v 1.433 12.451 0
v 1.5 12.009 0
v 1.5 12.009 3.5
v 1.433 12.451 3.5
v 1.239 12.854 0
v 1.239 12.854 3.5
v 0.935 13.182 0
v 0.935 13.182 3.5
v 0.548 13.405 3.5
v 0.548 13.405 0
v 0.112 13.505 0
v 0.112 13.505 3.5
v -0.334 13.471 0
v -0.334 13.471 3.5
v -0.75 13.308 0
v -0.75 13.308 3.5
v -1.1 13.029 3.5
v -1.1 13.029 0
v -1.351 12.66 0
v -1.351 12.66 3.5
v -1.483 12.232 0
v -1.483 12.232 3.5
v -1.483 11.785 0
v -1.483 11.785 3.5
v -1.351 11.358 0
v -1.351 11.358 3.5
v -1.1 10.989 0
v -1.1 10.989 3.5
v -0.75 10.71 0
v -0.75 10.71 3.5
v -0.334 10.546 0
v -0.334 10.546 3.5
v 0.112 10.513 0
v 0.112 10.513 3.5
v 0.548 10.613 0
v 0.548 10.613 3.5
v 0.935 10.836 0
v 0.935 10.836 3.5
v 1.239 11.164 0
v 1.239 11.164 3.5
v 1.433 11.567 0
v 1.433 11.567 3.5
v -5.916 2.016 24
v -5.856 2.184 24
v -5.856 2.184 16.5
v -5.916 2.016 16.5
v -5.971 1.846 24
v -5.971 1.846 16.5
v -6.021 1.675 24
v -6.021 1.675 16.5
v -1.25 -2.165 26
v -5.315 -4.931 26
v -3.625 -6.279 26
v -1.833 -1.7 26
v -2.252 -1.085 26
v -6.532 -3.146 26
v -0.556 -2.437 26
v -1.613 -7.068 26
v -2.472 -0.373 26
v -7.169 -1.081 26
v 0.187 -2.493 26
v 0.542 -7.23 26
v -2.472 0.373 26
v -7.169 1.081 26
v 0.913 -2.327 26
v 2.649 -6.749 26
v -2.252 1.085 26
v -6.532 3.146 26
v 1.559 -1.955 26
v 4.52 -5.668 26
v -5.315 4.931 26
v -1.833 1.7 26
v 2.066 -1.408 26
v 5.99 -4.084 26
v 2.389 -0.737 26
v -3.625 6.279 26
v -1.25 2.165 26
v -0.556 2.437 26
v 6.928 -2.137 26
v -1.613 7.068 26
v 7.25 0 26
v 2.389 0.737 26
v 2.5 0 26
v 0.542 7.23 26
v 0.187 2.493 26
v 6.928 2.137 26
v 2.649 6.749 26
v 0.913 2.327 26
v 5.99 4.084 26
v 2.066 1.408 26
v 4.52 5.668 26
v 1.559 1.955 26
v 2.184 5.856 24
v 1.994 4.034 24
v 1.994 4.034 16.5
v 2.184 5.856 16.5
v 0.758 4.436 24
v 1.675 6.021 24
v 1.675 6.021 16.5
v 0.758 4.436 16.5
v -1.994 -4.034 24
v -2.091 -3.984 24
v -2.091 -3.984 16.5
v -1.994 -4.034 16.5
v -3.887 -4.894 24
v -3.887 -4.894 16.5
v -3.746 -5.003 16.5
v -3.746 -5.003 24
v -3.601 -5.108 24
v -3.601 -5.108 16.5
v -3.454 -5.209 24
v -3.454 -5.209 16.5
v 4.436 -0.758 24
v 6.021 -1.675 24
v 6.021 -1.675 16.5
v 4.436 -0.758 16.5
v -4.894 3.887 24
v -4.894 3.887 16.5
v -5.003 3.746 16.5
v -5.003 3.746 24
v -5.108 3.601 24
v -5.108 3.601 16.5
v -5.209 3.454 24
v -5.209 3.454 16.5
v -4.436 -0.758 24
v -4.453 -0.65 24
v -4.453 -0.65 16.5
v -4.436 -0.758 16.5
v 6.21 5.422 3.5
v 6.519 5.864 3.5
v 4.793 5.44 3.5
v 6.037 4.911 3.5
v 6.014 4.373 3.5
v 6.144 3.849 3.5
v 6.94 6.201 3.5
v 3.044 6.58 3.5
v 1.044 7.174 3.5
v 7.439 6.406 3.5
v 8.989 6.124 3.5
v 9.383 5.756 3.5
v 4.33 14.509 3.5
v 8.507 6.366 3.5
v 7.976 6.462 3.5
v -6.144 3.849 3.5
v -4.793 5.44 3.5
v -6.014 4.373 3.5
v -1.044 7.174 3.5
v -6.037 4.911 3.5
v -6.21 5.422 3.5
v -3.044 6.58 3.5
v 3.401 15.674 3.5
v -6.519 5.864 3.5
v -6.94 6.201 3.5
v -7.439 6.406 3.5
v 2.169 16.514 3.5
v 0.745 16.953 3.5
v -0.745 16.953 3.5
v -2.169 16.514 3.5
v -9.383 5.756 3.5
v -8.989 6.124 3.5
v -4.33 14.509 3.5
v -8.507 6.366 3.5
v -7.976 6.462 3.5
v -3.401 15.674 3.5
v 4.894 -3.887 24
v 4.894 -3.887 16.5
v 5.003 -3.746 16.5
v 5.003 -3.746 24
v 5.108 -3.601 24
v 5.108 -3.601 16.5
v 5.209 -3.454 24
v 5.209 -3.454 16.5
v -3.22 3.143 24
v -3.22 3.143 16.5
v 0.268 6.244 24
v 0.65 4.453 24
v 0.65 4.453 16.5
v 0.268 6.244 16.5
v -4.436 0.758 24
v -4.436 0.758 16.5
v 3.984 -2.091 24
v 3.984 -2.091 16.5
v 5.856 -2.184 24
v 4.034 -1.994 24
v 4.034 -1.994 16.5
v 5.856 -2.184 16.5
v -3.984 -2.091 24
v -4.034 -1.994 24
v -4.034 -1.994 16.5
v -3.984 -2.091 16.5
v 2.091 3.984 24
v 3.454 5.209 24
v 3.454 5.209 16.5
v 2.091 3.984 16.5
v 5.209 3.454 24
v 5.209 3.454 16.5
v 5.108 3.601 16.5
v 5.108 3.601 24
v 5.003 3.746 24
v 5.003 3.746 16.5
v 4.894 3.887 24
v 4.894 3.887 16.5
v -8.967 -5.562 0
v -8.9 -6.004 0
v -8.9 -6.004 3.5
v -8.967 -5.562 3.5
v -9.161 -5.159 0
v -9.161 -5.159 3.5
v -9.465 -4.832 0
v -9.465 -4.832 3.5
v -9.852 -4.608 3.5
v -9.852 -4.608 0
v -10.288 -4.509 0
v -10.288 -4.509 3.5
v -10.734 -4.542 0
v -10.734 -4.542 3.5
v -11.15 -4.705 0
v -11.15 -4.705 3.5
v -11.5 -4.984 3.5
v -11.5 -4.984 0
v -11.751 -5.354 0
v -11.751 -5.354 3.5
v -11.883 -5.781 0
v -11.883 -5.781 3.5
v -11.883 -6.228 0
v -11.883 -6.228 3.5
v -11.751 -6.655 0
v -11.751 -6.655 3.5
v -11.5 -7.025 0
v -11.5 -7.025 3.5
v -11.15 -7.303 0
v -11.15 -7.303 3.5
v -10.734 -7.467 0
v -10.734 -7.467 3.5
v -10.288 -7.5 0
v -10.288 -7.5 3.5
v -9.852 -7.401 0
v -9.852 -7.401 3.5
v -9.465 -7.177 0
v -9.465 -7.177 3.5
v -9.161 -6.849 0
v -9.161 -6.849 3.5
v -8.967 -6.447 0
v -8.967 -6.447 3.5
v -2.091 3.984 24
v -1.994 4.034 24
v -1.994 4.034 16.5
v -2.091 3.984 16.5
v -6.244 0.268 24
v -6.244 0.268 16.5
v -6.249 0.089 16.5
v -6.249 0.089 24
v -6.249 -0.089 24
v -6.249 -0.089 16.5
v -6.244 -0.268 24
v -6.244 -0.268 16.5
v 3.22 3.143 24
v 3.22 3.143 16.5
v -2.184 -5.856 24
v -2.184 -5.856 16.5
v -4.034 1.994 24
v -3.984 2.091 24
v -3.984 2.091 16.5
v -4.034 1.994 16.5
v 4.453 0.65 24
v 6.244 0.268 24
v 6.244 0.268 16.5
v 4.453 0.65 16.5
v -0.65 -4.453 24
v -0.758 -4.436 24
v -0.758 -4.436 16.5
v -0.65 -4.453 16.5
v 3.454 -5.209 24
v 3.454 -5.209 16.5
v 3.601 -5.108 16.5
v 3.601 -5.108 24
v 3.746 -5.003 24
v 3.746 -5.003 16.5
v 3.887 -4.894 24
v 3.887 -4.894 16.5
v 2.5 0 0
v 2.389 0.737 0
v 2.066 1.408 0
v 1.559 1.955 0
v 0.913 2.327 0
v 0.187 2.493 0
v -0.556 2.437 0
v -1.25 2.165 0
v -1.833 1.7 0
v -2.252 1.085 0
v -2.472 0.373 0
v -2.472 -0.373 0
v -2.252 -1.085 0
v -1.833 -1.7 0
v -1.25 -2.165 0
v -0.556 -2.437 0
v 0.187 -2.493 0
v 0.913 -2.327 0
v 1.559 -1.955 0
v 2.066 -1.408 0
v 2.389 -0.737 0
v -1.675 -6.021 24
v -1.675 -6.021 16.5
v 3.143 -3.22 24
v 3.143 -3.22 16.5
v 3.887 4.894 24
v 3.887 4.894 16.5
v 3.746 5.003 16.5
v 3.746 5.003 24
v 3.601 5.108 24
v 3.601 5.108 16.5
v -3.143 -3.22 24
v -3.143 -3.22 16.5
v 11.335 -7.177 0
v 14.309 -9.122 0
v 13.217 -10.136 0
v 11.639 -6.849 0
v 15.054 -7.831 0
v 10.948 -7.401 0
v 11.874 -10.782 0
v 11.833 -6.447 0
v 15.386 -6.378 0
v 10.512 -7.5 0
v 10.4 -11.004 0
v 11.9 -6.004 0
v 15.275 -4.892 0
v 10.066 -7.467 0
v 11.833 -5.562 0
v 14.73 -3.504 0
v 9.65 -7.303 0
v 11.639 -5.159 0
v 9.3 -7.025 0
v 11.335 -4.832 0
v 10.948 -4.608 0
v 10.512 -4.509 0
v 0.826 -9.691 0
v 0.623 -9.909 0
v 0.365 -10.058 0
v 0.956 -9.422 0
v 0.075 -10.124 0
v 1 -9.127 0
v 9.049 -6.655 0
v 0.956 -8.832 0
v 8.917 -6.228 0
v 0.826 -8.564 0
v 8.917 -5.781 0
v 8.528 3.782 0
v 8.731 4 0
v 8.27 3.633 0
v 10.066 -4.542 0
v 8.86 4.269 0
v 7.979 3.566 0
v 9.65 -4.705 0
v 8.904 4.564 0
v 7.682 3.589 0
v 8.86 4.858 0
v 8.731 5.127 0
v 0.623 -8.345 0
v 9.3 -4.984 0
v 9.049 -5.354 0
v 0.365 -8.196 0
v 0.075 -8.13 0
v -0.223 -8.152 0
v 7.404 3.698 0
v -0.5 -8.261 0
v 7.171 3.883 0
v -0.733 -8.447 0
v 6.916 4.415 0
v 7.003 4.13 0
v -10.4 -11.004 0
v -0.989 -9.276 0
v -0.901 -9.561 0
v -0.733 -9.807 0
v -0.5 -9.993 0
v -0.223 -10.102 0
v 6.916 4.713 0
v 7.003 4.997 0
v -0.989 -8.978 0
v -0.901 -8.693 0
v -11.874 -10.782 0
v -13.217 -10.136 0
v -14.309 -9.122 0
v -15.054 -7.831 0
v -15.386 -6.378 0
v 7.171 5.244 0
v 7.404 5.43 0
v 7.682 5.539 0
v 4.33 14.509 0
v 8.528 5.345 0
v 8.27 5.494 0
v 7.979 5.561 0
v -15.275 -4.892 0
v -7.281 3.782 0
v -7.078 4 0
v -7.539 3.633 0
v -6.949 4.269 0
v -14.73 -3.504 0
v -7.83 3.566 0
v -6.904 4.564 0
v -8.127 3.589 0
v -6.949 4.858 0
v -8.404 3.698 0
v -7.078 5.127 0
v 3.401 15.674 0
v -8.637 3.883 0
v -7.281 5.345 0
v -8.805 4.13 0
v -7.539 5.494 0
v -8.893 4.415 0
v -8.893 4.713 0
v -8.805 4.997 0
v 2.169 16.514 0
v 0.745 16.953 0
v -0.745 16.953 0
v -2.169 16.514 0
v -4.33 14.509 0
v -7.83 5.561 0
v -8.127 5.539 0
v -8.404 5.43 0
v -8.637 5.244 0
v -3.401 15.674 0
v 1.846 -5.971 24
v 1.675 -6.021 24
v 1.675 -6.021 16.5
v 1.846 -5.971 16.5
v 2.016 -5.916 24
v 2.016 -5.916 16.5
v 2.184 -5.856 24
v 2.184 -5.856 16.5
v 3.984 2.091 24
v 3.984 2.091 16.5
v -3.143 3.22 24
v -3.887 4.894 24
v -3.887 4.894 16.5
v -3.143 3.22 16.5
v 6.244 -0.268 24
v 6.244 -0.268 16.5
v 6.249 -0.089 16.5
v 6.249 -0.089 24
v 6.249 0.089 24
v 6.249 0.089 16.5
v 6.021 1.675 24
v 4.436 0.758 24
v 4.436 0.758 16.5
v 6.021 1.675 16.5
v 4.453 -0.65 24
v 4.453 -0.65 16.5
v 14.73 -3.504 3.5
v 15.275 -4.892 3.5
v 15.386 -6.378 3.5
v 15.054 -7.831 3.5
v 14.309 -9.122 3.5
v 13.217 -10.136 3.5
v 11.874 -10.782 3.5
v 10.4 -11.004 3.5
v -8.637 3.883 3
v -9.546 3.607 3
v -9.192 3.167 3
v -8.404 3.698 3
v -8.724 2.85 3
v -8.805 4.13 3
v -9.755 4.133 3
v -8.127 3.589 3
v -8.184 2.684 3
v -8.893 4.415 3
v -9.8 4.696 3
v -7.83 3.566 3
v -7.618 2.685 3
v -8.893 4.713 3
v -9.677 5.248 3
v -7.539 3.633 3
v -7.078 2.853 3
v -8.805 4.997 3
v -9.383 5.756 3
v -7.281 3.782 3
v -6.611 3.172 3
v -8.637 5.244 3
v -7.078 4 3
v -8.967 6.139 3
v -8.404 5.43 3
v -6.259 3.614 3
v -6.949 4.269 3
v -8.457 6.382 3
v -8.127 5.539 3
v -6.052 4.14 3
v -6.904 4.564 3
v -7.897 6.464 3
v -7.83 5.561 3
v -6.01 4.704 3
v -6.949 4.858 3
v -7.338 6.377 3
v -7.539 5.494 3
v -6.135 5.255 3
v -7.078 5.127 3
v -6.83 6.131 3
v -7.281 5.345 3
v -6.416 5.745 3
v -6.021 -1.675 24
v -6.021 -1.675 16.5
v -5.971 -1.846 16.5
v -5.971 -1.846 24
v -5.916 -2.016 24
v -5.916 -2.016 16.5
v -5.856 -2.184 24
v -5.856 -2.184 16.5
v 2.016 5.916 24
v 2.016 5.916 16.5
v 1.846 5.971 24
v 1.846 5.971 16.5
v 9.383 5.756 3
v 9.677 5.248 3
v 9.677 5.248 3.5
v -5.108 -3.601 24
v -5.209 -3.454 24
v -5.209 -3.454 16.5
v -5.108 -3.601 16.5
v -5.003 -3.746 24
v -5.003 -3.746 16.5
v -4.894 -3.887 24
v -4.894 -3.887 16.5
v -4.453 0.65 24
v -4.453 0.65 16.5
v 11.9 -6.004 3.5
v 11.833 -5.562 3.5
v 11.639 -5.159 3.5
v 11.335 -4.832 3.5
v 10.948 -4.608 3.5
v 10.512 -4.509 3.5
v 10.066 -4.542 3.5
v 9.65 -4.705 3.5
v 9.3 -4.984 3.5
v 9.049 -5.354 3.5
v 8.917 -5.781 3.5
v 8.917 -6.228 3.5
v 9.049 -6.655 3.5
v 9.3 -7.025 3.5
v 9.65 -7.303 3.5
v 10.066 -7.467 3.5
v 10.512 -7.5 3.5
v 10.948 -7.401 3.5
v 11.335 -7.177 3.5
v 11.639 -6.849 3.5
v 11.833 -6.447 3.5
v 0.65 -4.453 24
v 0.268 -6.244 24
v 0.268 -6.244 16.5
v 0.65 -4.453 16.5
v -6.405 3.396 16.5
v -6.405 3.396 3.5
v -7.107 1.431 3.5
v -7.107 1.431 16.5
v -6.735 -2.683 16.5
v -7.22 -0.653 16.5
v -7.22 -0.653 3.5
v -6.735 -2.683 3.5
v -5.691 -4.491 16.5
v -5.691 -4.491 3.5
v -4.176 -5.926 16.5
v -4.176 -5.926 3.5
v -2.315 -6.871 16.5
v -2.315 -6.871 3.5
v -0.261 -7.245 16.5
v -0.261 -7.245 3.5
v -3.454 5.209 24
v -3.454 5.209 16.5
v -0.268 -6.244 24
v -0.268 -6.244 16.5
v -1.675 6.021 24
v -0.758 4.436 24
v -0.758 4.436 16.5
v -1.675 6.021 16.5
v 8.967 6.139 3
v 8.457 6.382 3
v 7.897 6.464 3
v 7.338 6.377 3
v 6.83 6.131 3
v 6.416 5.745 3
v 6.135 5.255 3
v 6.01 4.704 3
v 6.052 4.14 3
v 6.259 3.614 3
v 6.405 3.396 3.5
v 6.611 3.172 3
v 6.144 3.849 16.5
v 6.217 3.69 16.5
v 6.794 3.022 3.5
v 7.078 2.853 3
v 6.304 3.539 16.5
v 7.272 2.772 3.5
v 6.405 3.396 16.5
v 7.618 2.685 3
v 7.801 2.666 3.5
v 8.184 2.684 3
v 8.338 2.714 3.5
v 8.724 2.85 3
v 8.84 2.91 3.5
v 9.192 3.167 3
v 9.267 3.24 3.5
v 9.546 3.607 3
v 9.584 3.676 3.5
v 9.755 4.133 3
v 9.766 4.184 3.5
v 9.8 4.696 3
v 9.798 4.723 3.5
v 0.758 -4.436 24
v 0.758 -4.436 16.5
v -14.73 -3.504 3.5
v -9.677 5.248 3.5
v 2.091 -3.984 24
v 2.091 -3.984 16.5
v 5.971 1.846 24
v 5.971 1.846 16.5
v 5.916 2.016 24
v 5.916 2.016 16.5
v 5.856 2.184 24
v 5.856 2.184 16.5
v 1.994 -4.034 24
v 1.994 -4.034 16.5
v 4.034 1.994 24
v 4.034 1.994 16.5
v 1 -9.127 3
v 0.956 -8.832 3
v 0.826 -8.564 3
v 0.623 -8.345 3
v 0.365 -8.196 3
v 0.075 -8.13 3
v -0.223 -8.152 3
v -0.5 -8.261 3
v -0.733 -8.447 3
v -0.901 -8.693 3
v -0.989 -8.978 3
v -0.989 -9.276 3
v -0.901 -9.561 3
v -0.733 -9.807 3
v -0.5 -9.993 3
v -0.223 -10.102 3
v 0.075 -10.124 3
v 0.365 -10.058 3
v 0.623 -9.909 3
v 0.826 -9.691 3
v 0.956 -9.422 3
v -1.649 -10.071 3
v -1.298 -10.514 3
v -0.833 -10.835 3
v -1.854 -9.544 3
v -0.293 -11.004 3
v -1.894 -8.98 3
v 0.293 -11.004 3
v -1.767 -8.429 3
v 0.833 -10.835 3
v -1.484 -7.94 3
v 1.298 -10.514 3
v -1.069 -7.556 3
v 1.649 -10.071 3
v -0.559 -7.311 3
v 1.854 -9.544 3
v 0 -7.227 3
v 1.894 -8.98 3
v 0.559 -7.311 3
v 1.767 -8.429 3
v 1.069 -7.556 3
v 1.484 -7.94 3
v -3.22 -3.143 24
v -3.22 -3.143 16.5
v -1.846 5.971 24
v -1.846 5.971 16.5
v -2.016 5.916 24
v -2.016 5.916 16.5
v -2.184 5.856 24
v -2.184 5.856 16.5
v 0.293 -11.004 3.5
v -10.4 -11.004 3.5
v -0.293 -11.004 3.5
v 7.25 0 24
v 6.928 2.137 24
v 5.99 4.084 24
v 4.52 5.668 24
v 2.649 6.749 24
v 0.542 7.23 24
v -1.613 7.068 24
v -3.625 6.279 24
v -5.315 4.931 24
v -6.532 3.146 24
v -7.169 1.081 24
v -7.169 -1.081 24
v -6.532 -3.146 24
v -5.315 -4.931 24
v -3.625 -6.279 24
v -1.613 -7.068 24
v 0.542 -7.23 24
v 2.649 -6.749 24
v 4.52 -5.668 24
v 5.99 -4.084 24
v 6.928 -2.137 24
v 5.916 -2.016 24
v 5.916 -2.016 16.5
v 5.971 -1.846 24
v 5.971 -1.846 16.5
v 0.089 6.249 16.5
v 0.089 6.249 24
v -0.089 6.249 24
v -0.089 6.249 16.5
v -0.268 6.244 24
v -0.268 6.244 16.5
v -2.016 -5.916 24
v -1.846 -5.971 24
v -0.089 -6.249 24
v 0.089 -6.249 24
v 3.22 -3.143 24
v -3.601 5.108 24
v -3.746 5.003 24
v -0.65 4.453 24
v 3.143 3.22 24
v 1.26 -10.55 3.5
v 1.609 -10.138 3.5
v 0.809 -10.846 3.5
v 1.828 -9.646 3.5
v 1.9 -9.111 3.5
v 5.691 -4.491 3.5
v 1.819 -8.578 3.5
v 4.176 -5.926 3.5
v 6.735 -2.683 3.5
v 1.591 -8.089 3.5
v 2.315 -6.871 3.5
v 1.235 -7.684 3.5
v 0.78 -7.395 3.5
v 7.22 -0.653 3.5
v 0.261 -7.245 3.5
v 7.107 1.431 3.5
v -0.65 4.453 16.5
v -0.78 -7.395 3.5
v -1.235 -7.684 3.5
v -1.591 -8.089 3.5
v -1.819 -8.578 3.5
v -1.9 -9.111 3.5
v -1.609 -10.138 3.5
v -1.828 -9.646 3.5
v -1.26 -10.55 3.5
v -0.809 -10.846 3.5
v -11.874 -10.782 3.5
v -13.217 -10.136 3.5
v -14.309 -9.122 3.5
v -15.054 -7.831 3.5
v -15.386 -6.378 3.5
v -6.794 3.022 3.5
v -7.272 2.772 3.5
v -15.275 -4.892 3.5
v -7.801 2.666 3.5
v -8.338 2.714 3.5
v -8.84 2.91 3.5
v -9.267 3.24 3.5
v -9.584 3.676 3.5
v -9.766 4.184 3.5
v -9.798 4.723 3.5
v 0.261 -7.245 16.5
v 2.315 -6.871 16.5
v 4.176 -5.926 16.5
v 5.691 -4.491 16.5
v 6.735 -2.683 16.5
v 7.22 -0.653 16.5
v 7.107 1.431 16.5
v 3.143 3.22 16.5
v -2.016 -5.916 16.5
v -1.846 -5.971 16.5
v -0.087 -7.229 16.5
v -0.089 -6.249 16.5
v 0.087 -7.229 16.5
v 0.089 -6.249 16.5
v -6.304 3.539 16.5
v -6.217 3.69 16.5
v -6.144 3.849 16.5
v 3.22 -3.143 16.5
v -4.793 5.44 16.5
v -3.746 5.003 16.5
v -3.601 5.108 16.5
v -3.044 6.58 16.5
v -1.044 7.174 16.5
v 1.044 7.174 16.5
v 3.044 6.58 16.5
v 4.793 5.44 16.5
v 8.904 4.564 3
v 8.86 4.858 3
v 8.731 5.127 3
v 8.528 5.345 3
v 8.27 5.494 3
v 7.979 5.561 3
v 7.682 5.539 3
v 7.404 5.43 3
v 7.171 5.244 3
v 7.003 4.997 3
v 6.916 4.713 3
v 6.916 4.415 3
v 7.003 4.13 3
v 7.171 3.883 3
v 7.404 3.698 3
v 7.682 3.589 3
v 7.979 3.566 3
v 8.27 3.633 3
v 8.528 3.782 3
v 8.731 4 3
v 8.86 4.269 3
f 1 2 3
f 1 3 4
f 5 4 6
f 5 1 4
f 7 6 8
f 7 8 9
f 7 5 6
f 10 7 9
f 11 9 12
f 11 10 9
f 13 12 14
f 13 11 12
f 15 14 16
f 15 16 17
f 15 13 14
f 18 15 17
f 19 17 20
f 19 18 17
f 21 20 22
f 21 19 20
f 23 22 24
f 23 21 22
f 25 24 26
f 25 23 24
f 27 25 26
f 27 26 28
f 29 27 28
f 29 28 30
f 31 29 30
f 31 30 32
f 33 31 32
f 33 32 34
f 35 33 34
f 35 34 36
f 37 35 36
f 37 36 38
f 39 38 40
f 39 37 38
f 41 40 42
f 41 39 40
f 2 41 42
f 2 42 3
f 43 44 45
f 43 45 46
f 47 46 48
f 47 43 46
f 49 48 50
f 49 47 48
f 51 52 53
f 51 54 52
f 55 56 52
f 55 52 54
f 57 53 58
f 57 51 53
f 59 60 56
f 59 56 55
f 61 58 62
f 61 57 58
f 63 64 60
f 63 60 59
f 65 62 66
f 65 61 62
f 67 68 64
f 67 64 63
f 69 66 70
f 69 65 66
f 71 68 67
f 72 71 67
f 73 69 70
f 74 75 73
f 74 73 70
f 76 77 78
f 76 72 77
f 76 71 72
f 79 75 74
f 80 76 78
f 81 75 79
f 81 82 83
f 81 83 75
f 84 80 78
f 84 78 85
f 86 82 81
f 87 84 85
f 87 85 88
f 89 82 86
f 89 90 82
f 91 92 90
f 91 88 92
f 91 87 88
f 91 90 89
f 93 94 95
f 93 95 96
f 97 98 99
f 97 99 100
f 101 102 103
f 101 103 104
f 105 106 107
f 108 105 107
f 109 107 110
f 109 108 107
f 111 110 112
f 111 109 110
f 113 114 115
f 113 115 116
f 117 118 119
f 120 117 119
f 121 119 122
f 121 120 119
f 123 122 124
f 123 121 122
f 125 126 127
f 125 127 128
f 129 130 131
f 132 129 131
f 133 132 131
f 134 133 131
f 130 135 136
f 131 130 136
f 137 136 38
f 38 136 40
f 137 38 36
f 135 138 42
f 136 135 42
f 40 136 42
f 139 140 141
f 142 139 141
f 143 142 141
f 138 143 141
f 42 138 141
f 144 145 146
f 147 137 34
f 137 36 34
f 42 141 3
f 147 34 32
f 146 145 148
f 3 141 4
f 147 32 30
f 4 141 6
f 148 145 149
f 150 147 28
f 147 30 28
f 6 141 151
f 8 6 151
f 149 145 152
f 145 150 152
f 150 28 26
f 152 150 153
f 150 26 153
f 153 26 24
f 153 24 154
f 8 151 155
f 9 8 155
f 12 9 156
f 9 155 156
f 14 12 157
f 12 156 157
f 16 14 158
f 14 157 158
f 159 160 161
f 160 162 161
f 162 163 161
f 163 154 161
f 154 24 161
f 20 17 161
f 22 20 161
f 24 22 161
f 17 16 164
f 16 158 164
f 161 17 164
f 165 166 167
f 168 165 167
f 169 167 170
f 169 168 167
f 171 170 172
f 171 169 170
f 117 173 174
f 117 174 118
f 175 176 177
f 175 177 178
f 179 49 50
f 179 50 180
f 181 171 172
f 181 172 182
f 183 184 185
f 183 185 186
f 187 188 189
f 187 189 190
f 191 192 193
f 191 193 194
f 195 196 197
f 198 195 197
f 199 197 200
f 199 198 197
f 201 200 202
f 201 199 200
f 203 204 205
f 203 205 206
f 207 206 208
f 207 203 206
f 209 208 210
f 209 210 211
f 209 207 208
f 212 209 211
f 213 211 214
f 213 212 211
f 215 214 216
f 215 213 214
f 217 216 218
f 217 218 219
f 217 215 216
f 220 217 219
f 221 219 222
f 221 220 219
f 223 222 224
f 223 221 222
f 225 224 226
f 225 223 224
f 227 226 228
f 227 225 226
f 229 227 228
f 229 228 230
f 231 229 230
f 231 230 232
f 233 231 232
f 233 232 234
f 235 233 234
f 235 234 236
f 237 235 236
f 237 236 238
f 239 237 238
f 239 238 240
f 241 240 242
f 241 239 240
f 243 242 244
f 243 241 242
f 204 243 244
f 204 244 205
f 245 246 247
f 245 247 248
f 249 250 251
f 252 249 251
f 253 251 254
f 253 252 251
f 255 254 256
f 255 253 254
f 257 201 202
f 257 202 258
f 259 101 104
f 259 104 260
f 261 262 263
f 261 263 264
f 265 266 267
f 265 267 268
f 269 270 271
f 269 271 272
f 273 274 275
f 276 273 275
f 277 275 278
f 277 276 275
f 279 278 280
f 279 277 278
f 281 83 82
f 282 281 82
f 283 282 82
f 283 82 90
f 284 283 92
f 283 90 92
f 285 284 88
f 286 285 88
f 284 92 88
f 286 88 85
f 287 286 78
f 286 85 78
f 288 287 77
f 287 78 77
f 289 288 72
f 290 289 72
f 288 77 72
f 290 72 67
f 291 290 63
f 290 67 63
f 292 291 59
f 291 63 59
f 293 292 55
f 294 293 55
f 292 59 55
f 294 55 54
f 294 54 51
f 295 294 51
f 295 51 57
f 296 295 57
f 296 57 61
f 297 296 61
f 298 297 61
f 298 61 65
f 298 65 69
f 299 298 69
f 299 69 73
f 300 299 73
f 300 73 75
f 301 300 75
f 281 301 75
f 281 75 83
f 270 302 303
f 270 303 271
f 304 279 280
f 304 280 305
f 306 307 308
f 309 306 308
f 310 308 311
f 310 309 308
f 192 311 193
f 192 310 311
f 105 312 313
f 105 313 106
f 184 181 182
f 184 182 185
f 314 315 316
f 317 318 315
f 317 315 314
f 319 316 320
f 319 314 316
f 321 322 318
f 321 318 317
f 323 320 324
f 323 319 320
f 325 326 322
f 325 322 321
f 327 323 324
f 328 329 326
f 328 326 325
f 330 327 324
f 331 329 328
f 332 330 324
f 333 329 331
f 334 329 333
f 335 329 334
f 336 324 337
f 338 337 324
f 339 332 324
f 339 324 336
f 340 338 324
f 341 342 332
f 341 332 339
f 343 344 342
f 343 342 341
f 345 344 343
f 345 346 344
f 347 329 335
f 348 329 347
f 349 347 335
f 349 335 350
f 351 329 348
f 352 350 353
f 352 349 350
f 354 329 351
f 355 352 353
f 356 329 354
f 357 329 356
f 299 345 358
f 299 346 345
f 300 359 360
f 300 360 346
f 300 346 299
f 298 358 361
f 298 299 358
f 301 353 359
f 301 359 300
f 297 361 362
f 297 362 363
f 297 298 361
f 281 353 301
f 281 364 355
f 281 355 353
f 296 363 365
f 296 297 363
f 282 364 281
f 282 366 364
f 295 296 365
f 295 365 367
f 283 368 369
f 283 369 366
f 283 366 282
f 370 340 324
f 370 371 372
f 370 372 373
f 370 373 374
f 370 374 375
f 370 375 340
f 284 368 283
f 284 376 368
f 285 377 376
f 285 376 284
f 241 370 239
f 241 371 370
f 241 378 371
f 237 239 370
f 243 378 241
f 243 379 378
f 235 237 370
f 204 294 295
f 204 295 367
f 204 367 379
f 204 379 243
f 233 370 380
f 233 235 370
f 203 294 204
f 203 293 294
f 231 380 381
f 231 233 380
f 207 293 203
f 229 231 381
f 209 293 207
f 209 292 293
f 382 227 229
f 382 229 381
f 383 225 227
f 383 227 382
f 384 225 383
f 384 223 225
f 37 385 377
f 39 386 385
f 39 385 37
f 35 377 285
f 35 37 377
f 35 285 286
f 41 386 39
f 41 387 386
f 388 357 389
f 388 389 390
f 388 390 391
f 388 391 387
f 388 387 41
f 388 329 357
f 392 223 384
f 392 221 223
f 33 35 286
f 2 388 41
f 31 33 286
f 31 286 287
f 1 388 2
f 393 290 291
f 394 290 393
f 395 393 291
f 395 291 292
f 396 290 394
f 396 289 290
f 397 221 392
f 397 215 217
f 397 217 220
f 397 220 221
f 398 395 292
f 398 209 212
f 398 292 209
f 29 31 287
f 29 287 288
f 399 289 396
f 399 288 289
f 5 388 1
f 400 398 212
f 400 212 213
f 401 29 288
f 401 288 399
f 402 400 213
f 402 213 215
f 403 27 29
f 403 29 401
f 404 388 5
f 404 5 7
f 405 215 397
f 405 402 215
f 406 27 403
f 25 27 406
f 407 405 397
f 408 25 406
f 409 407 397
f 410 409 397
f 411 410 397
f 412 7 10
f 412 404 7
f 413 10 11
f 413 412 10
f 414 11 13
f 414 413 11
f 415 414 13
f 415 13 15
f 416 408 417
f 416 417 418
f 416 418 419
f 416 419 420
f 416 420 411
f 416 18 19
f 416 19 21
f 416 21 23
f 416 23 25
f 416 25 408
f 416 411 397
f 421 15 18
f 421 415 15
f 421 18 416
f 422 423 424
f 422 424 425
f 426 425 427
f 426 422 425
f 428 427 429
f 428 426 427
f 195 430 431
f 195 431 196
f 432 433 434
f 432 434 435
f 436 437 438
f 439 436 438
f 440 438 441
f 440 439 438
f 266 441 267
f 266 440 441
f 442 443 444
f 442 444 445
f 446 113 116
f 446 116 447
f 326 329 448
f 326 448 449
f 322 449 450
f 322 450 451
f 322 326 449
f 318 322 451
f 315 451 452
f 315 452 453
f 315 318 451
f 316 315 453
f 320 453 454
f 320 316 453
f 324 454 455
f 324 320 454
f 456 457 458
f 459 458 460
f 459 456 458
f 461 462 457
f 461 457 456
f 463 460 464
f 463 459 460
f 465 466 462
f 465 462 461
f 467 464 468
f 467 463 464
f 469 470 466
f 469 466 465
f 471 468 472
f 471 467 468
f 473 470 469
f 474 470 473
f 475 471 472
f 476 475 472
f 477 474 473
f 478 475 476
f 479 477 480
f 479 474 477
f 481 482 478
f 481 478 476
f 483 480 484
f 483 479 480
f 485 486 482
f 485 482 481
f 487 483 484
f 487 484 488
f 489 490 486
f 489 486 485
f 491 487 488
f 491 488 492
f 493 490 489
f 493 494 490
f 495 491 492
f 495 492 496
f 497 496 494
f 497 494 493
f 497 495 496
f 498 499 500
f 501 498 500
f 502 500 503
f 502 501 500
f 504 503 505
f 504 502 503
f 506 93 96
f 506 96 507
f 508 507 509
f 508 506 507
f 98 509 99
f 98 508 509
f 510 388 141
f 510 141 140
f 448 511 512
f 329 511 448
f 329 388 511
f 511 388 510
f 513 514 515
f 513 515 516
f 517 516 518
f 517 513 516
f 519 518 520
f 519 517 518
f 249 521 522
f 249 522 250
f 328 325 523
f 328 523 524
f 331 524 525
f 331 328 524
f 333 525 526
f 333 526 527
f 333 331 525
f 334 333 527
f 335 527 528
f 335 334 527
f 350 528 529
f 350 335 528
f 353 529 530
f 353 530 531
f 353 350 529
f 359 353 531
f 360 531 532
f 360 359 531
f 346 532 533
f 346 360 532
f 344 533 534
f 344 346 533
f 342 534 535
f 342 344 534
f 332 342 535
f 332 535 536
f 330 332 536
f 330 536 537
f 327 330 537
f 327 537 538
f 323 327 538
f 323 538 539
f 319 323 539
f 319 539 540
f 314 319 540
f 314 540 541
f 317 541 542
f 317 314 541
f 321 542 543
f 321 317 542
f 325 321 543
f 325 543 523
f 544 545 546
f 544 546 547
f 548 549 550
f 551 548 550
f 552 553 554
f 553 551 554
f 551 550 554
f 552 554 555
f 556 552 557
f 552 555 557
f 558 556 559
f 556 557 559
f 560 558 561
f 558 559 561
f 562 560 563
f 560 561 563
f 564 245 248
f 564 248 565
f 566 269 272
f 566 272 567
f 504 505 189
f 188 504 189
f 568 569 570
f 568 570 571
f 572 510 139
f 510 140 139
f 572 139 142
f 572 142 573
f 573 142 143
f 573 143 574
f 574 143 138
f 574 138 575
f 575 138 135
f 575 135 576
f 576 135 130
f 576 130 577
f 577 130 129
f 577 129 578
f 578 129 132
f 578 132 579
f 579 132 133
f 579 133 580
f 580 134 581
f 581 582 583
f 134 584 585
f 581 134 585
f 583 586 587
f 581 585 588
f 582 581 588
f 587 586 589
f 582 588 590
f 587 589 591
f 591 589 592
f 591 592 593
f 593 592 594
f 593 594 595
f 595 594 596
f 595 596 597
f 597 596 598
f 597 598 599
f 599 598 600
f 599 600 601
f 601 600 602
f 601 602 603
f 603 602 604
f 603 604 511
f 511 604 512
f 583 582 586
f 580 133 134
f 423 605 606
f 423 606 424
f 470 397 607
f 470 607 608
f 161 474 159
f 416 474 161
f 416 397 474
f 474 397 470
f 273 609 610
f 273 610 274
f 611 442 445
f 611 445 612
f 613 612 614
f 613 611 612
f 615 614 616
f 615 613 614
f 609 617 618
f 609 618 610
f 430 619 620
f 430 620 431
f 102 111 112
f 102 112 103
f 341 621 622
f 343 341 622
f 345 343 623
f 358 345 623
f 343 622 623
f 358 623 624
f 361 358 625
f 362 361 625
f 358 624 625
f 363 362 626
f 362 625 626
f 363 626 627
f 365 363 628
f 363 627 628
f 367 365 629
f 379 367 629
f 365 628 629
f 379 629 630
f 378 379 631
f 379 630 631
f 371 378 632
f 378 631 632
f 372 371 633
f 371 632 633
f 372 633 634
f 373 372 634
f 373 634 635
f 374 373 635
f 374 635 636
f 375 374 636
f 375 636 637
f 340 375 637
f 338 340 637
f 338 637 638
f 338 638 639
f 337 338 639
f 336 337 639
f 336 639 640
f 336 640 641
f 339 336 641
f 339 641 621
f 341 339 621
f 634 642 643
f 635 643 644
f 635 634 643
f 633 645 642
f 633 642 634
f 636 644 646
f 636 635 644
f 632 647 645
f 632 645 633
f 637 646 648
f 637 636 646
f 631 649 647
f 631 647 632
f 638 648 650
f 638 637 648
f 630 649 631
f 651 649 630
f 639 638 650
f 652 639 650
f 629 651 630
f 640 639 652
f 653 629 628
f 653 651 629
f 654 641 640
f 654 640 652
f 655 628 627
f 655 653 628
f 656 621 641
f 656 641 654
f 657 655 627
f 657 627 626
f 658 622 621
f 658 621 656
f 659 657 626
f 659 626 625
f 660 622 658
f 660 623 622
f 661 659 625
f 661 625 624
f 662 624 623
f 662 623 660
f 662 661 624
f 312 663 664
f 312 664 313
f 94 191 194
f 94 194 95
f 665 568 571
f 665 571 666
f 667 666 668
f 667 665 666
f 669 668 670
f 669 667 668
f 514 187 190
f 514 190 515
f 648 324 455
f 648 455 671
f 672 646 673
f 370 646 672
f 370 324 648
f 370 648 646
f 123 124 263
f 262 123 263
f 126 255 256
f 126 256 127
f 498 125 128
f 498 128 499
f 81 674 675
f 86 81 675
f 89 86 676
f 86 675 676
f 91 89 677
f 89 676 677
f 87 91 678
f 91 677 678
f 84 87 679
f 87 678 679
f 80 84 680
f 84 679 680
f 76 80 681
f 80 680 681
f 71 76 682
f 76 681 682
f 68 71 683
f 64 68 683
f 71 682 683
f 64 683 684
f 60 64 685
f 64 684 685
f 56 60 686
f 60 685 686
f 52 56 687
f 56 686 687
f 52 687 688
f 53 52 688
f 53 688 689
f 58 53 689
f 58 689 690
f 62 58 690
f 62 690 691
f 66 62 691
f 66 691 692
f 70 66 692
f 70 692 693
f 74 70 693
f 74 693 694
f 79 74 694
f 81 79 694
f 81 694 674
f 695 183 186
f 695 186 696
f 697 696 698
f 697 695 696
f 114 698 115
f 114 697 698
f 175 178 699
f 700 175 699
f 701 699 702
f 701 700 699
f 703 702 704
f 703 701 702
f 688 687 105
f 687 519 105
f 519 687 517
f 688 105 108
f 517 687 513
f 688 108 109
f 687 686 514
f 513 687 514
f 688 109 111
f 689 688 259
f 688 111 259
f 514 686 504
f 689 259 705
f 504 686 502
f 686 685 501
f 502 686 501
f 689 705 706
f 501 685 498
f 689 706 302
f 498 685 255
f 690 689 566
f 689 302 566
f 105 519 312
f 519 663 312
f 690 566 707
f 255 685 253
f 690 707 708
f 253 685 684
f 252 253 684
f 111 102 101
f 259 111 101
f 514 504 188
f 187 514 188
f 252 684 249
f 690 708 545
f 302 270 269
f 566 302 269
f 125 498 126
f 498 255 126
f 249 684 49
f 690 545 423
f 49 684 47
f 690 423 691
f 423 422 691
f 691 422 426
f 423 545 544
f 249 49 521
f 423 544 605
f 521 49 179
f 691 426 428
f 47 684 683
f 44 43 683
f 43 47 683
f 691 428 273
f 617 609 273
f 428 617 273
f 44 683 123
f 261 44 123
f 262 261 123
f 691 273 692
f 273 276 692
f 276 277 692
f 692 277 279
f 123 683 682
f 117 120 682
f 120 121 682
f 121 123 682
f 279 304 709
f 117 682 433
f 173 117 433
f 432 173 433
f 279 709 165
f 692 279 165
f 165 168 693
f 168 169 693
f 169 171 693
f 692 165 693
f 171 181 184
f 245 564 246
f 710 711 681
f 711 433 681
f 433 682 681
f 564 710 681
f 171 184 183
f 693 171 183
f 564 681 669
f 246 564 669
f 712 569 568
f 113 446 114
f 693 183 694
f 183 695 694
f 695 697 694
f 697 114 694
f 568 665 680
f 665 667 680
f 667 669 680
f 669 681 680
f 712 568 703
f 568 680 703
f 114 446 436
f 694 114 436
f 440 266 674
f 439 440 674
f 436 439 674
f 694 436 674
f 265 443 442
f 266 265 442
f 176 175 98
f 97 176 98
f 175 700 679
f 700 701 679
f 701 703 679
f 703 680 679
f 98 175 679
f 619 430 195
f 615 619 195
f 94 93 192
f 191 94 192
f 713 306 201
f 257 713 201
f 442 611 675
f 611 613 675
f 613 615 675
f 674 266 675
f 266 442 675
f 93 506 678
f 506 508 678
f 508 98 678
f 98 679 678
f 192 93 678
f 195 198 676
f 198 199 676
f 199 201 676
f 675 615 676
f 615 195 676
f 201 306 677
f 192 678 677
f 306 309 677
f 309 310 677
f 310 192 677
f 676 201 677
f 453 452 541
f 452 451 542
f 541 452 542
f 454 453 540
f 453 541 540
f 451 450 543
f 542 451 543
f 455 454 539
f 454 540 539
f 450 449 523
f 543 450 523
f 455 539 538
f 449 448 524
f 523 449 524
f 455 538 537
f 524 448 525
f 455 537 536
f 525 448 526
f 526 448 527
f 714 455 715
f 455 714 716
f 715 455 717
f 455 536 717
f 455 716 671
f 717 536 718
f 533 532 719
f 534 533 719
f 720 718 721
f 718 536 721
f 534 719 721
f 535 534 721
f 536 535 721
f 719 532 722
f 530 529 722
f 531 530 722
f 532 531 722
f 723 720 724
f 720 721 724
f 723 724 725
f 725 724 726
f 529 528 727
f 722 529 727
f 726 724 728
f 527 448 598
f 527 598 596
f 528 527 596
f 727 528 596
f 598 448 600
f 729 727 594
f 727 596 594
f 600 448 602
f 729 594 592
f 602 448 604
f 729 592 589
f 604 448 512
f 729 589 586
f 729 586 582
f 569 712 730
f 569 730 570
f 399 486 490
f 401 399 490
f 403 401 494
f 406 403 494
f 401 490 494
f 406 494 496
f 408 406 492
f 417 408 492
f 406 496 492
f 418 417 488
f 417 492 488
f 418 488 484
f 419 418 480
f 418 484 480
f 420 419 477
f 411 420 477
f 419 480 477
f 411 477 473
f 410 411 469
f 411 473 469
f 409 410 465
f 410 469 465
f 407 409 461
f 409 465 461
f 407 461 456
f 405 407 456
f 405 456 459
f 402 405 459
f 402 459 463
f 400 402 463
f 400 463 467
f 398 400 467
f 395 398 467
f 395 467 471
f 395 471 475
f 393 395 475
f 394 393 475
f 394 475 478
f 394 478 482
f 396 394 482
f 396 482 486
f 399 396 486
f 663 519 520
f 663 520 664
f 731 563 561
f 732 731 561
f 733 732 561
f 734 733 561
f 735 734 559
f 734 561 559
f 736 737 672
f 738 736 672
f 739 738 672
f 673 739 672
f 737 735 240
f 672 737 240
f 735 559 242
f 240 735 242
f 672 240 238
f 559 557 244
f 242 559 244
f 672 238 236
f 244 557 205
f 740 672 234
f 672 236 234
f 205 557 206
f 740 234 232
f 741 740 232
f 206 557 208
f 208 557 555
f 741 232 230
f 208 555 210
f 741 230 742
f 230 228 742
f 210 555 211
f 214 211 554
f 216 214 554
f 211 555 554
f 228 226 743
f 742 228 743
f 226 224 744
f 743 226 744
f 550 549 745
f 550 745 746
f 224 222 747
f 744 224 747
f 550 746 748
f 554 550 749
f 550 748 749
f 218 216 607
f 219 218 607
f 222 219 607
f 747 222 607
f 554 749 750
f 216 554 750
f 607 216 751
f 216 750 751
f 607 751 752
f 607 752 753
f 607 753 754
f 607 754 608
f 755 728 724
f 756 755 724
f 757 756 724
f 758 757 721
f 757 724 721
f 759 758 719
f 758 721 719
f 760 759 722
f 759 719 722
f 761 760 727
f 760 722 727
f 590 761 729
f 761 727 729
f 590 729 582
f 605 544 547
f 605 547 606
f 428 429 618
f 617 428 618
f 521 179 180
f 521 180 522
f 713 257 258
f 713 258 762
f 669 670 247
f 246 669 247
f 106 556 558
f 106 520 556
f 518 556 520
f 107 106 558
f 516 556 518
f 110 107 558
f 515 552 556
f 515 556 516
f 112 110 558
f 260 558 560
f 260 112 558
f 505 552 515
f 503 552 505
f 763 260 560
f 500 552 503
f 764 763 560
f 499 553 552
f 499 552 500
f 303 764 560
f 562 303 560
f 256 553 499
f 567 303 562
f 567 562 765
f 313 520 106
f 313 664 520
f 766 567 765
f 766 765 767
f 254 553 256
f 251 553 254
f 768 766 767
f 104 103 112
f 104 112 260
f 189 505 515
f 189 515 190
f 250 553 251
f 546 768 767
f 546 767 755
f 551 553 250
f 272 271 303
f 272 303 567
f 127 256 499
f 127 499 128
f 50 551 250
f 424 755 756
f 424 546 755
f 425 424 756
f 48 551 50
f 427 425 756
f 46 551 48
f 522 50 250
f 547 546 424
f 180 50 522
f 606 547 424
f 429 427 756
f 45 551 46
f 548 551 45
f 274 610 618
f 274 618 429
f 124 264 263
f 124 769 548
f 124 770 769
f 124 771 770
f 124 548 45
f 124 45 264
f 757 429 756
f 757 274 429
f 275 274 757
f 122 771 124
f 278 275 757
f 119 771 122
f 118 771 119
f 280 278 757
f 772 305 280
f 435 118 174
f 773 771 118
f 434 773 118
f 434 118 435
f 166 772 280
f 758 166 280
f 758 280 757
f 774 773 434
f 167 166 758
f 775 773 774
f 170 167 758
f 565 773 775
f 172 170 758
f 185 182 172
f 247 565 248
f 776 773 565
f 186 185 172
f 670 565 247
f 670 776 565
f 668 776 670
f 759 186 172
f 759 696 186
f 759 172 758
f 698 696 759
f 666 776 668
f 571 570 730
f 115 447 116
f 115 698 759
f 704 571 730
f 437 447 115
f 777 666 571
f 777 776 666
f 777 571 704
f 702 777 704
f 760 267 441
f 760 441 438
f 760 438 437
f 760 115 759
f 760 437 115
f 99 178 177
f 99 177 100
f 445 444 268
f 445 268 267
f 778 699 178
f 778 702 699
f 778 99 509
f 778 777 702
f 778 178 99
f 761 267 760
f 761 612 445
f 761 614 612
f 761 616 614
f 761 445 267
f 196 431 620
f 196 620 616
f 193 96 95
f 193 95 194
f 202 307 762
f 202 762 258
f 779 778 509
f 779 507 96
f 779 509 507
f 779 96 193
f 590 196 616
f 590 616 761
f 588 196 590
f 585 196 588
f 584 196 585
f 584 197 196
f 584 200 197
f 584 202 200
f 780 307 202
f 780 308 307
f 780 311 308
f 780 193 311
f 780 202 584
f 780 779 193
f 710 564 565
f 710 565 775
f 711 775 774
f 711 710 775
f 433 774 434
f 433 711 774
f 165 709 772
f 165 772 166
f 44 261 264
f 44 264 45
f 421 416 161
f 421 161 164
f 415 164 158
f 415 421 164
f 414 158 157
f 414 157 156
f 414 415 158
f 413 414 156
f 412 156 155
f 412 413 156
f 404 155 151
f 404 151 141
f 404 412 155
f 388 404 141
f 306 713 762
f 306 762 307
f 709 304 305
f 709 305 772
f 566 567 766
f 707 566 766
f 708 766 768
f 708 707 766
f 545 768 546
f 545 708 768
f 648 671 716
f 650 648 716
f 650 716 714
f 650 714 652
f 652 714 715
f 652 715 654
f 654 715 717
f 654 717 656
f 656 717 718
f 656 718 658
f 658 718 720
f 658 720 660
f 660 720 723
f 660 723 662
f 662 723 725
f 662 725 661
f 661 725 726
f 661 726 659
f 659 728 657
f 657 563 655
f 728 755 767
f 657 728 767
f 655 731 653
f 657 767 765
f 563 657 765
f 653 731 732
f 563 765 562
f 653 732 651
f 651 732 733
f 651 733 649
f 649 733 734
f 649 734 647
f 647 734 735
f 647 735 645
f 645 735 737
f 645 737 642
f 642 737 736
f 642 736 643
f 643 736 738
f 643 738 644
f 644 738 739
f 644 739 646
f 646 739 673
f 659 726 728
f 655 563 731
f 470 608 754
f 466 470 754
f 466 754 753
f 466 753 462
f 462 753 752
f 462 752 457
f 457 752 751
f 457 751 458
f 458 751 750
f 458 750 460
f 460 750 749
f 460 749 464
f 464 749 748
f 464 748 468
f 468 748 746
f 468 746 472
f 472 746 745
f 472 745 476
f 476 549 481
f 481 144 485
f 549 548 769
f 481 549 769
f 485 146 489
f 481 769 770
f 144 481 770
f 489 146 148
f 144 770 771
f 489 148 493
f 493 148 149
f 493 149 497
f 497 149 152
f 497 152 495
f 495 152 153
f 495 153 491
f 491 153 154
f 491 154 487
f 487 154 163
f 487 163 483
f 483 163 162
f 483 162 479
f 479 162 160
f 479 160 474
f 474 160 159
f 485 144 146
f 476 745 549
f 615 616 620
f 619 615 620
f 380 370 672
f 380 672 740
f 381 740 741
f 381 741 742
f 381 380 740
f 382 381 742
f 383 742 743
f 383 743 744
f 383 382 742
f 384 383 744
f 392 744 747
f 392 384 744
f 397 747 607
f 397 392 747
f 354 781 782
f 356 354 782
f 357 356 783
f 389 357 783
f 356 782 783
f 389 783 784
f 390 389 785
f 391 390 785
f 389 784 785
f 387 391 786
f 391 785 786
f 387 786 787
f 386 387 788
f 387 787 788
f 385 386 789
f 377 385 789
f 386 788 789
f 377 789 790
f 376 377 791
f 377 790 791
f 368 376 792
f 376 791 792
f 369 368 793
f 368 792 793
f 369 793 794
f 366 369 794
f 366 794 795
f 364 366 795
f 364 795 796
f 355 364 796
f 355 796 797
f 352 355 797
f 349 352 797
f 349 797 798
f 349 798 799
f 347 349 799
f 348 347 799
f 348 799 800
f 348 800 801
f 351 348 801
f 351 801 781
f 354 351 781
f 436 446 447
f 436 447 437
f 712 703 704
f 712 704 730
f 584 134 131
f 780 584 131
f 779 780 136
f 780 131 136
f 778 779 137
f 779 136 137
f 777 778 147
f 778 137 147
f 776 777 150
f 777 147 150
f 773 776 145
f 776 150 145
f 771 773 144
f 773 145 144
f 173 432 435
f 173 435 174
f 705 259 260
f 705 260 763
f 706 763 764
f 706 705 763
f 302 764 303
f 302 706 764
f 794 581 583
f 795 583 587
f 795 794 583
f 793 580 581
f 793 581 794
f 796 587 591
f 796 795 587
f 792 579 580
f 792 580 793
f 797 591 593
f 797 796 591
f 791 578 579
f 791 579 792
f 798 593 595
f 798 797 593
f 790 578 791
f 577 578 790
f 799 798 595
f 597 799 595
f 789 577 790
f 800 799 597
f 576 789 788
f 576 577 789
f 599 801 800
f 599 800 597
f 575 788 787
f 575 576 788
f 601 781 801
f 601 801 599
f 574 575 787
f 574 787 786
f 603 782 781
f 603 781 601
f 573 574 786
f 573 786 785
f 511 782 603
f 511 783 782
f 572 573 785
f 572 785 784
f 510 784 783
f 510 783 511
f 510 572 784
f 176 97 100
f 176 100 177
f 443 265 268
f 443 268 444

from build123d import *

# Parameters (mm, degrees)
SKETCH1_R               = 1.5
BOSS_EXTRUDE1_DEPTH     = 3.5
SKETCH2_R               = 7.25
BOSS_EXTRUDE2_DEPTH     = 22.5
SKETCH3_R               = 2.5
CUT_EXTRUDE1_DEPTH      = 27
SKETCH6_R               = 9.569614172
CUT_EXTRUDE6_DEPTH      = 7.5
SKETCH7_R               = 17.775779512
SKETCH7_R_2             = 6.25
CUT_EXTRUDE7_DEPTH      = 7.5
SKETCH8_R               = 1
CUT_EXTRUDE8_DEPTH      = 4.5
SKETCH9_R               = 1.9
CUT_EXTRUDE9_DEPTH      = 13
CUT_EXTRUDE9_DEPTH_BACK = 0.5


with BuildPart() as part:
    # Sketch1 → Boss-Extrude1 (new body)
    with BuildSketch(Plane.XY):
        with BuildLine():
            Line((-14.730127019, -3.5044428), (-4.330127019, 14.508885599))
            ThreePointArc((-4.330127019, 14.508885599), (0, 17.008885599), (4.330127019, 14.508885599))
            Line((4.330127019, 14.508885599), (14.730127019, -3.5044428))
            ThreePointArc((14.730127019, -3.5044428), (14.730127019, -8.5044428), (10.4, -11.0044428))
            Line((10.4, -11.0044428), (-10.4, -11.0044428))
            ThreePointArc((-10.4, -11.0044428), (-14.730127019, -8.5044428), (-14.730127019, -3.5044428))
        make_face()
        with Locations((0, 12.008885599)):
            Circle(SKETCH1_R, mode=Mode.SUBTRACT)
        with Locations((-10.4, -6.0044428)):
            Circle(SKETCH1_R, mode=Mode.SUBTRACT)
        with Locations((10.4, -6.0044428)):
            Circle(SKETCH1_R, mode=Mode.SUBTRACT)
    extrude(amount=BOSS_EXTRUDE1_DEPTH)

    # Sketch2 → Boss-Extrude2 (add)
    with BuildSketch(Plane.XY.offset(3.5)):
        Circle(SKETCH2_R)
    extrude(amount=BOSS_EXTRUDE2_DEPTH)

    # Sketch3 → Cut-Extrude1 (cut, through all)
    with BuildSketch(Plane.XY.offset(26)):
        Circle(SKETCH3_R)
    extrude(amount=-CUT_EXTRUDE1_DEPTH, mode=Mode.SUBTRACT)

    # Sketch6 → Cut-Extrude6 (cut)
    with BuildSketch(Plane.XY.offset(24)):
        Circle(SKETCH6_R)
        Polygon((7.5, 0), (4.452808103, 0.65), (4.435733208, 0.757806641), (7.132923872, 2.317627458), (4.034011116, 1.994180112), (3.984457842, 2.091433888), (6.067627458, 4.408389392), (3.220337014, 3.14315598), (3.14315598, 3.220337014), (4.408389392, 6.067627458), (2.091433888, 3.984457842), (1.994180112, 4.034011116), (2.317627458, 7.132923872), (0.757806641, 4.435733208), (0.65, 4.452808103), (0, 7.5), (-0.65, 4.452808103), (-0.757806641, 4.435733208), (-2.317627458, 7.132923872), (-1.994180112, 4.034011116), (-2.091433888, 3.984457842), (-4.408389392, 6.067627458), (-3.14315598, 3.220337014), (-3.220337014, 3.14315598), (-6.067627458, 4.408389392), (-3.984457842, 2.091433888), (-4.034011116, 1.994180112), (-7.132923872, 2.317627458), (-4.435733208, 0.757806641), (-4.452808103, 0.65), (-7.5, 0), (-4.452808103, -0.65), (-4.435733208, -0.757806641), (-7.132923872, -2.317627458), (-4.034011116, -1.994180112), (-3.984457842, -2.091433888), (-6.067627458, -4.408389392), (-3.220337014, -3.14315598), (-3.14315598, -3.220337014), (-4.408389392, -6.067627458), (-2.091433888, -3.984457842), (-1.994180112, -4.034011116), (-2.317627458, -7.132923872), (-0.757806641, -4.435733208), (-0.65, -4.452808103), (0, -7.5), (0.65, -4.452808103), (0.757806641, -4.435733208), (2.317627458, -7.132923872), (1.994180112, -4.034011116), (2.091433888, -3.984457842), (4.408389392, -6.067627458), (3.14315598, -3.220337014), (3.220337014, -3.14315598), (6.067627458, -4.408389392), (3.984457842, -2.091433888), (4.034011116, -1.994180112), (7.132923872, -2.317627458), (4.435733208, -0.757806641), (4.452808103, -0.65), align=None, mode=Mode.SUBTRACT)
    extrude(amount=-CUT_EXTRUDE6_DEPTH, mode=Mode.SUBTRACT)

    # Sketch7 → Cut-Extrude7 (cut)
    with BuildSketch(Plane.XY.offset(24)):
        Circle(SKETCH7_R)
        Circle(SKETCH7_R_2, mode=Mode.SUBTRACT)
    extrude(amount=-CUT_EXTRUDE7_DEPTH, mode=Mode.SUBTRACT)

    # Sketch8 → Cut-Extrude8 (cut, through all)
    with BuildSketch(Plane.XY.offset(3.5)):
        with Locations((7.904405598, 4.5636107)):
            Circle(SKETCH8_R)
        with Locations((0, -9.1272214)):
            Circle(SKETCH8_R)
        with Locations((-7.904405598, 4.5636107)):
            Circle(SKETCH8_R)
    extrude(amount=-CUT_EXTRUDE8_DEPTH, mode=Mode.SUBTRACT)

    # Sketch9 → Cut-Extrude9 (cut, two sides)
    with BuildSketch(Plane.XY.offset(3.5)) as cut_extrude9_sk:
        with Locations((7.904405598, 4.5636107)):
            Circle(SKETCH9_R)
        with Locations((0, -9.1272214)):
            Circle(SKETCH9_R)
        with Locations((-7.904405598, 4.5636107)):
            Circle(SKETCH9_R)
    extrude(amount=CUT_EXTRUDE9_DEPTH, mode=Mode.SUBTRACT)
    extrude(cut_extrude9_sk.sketch, amount=-CUT_EXTRUDE9_DEPTH_BACK, mode=Mode.SUBTRACT)


solid = part.part
